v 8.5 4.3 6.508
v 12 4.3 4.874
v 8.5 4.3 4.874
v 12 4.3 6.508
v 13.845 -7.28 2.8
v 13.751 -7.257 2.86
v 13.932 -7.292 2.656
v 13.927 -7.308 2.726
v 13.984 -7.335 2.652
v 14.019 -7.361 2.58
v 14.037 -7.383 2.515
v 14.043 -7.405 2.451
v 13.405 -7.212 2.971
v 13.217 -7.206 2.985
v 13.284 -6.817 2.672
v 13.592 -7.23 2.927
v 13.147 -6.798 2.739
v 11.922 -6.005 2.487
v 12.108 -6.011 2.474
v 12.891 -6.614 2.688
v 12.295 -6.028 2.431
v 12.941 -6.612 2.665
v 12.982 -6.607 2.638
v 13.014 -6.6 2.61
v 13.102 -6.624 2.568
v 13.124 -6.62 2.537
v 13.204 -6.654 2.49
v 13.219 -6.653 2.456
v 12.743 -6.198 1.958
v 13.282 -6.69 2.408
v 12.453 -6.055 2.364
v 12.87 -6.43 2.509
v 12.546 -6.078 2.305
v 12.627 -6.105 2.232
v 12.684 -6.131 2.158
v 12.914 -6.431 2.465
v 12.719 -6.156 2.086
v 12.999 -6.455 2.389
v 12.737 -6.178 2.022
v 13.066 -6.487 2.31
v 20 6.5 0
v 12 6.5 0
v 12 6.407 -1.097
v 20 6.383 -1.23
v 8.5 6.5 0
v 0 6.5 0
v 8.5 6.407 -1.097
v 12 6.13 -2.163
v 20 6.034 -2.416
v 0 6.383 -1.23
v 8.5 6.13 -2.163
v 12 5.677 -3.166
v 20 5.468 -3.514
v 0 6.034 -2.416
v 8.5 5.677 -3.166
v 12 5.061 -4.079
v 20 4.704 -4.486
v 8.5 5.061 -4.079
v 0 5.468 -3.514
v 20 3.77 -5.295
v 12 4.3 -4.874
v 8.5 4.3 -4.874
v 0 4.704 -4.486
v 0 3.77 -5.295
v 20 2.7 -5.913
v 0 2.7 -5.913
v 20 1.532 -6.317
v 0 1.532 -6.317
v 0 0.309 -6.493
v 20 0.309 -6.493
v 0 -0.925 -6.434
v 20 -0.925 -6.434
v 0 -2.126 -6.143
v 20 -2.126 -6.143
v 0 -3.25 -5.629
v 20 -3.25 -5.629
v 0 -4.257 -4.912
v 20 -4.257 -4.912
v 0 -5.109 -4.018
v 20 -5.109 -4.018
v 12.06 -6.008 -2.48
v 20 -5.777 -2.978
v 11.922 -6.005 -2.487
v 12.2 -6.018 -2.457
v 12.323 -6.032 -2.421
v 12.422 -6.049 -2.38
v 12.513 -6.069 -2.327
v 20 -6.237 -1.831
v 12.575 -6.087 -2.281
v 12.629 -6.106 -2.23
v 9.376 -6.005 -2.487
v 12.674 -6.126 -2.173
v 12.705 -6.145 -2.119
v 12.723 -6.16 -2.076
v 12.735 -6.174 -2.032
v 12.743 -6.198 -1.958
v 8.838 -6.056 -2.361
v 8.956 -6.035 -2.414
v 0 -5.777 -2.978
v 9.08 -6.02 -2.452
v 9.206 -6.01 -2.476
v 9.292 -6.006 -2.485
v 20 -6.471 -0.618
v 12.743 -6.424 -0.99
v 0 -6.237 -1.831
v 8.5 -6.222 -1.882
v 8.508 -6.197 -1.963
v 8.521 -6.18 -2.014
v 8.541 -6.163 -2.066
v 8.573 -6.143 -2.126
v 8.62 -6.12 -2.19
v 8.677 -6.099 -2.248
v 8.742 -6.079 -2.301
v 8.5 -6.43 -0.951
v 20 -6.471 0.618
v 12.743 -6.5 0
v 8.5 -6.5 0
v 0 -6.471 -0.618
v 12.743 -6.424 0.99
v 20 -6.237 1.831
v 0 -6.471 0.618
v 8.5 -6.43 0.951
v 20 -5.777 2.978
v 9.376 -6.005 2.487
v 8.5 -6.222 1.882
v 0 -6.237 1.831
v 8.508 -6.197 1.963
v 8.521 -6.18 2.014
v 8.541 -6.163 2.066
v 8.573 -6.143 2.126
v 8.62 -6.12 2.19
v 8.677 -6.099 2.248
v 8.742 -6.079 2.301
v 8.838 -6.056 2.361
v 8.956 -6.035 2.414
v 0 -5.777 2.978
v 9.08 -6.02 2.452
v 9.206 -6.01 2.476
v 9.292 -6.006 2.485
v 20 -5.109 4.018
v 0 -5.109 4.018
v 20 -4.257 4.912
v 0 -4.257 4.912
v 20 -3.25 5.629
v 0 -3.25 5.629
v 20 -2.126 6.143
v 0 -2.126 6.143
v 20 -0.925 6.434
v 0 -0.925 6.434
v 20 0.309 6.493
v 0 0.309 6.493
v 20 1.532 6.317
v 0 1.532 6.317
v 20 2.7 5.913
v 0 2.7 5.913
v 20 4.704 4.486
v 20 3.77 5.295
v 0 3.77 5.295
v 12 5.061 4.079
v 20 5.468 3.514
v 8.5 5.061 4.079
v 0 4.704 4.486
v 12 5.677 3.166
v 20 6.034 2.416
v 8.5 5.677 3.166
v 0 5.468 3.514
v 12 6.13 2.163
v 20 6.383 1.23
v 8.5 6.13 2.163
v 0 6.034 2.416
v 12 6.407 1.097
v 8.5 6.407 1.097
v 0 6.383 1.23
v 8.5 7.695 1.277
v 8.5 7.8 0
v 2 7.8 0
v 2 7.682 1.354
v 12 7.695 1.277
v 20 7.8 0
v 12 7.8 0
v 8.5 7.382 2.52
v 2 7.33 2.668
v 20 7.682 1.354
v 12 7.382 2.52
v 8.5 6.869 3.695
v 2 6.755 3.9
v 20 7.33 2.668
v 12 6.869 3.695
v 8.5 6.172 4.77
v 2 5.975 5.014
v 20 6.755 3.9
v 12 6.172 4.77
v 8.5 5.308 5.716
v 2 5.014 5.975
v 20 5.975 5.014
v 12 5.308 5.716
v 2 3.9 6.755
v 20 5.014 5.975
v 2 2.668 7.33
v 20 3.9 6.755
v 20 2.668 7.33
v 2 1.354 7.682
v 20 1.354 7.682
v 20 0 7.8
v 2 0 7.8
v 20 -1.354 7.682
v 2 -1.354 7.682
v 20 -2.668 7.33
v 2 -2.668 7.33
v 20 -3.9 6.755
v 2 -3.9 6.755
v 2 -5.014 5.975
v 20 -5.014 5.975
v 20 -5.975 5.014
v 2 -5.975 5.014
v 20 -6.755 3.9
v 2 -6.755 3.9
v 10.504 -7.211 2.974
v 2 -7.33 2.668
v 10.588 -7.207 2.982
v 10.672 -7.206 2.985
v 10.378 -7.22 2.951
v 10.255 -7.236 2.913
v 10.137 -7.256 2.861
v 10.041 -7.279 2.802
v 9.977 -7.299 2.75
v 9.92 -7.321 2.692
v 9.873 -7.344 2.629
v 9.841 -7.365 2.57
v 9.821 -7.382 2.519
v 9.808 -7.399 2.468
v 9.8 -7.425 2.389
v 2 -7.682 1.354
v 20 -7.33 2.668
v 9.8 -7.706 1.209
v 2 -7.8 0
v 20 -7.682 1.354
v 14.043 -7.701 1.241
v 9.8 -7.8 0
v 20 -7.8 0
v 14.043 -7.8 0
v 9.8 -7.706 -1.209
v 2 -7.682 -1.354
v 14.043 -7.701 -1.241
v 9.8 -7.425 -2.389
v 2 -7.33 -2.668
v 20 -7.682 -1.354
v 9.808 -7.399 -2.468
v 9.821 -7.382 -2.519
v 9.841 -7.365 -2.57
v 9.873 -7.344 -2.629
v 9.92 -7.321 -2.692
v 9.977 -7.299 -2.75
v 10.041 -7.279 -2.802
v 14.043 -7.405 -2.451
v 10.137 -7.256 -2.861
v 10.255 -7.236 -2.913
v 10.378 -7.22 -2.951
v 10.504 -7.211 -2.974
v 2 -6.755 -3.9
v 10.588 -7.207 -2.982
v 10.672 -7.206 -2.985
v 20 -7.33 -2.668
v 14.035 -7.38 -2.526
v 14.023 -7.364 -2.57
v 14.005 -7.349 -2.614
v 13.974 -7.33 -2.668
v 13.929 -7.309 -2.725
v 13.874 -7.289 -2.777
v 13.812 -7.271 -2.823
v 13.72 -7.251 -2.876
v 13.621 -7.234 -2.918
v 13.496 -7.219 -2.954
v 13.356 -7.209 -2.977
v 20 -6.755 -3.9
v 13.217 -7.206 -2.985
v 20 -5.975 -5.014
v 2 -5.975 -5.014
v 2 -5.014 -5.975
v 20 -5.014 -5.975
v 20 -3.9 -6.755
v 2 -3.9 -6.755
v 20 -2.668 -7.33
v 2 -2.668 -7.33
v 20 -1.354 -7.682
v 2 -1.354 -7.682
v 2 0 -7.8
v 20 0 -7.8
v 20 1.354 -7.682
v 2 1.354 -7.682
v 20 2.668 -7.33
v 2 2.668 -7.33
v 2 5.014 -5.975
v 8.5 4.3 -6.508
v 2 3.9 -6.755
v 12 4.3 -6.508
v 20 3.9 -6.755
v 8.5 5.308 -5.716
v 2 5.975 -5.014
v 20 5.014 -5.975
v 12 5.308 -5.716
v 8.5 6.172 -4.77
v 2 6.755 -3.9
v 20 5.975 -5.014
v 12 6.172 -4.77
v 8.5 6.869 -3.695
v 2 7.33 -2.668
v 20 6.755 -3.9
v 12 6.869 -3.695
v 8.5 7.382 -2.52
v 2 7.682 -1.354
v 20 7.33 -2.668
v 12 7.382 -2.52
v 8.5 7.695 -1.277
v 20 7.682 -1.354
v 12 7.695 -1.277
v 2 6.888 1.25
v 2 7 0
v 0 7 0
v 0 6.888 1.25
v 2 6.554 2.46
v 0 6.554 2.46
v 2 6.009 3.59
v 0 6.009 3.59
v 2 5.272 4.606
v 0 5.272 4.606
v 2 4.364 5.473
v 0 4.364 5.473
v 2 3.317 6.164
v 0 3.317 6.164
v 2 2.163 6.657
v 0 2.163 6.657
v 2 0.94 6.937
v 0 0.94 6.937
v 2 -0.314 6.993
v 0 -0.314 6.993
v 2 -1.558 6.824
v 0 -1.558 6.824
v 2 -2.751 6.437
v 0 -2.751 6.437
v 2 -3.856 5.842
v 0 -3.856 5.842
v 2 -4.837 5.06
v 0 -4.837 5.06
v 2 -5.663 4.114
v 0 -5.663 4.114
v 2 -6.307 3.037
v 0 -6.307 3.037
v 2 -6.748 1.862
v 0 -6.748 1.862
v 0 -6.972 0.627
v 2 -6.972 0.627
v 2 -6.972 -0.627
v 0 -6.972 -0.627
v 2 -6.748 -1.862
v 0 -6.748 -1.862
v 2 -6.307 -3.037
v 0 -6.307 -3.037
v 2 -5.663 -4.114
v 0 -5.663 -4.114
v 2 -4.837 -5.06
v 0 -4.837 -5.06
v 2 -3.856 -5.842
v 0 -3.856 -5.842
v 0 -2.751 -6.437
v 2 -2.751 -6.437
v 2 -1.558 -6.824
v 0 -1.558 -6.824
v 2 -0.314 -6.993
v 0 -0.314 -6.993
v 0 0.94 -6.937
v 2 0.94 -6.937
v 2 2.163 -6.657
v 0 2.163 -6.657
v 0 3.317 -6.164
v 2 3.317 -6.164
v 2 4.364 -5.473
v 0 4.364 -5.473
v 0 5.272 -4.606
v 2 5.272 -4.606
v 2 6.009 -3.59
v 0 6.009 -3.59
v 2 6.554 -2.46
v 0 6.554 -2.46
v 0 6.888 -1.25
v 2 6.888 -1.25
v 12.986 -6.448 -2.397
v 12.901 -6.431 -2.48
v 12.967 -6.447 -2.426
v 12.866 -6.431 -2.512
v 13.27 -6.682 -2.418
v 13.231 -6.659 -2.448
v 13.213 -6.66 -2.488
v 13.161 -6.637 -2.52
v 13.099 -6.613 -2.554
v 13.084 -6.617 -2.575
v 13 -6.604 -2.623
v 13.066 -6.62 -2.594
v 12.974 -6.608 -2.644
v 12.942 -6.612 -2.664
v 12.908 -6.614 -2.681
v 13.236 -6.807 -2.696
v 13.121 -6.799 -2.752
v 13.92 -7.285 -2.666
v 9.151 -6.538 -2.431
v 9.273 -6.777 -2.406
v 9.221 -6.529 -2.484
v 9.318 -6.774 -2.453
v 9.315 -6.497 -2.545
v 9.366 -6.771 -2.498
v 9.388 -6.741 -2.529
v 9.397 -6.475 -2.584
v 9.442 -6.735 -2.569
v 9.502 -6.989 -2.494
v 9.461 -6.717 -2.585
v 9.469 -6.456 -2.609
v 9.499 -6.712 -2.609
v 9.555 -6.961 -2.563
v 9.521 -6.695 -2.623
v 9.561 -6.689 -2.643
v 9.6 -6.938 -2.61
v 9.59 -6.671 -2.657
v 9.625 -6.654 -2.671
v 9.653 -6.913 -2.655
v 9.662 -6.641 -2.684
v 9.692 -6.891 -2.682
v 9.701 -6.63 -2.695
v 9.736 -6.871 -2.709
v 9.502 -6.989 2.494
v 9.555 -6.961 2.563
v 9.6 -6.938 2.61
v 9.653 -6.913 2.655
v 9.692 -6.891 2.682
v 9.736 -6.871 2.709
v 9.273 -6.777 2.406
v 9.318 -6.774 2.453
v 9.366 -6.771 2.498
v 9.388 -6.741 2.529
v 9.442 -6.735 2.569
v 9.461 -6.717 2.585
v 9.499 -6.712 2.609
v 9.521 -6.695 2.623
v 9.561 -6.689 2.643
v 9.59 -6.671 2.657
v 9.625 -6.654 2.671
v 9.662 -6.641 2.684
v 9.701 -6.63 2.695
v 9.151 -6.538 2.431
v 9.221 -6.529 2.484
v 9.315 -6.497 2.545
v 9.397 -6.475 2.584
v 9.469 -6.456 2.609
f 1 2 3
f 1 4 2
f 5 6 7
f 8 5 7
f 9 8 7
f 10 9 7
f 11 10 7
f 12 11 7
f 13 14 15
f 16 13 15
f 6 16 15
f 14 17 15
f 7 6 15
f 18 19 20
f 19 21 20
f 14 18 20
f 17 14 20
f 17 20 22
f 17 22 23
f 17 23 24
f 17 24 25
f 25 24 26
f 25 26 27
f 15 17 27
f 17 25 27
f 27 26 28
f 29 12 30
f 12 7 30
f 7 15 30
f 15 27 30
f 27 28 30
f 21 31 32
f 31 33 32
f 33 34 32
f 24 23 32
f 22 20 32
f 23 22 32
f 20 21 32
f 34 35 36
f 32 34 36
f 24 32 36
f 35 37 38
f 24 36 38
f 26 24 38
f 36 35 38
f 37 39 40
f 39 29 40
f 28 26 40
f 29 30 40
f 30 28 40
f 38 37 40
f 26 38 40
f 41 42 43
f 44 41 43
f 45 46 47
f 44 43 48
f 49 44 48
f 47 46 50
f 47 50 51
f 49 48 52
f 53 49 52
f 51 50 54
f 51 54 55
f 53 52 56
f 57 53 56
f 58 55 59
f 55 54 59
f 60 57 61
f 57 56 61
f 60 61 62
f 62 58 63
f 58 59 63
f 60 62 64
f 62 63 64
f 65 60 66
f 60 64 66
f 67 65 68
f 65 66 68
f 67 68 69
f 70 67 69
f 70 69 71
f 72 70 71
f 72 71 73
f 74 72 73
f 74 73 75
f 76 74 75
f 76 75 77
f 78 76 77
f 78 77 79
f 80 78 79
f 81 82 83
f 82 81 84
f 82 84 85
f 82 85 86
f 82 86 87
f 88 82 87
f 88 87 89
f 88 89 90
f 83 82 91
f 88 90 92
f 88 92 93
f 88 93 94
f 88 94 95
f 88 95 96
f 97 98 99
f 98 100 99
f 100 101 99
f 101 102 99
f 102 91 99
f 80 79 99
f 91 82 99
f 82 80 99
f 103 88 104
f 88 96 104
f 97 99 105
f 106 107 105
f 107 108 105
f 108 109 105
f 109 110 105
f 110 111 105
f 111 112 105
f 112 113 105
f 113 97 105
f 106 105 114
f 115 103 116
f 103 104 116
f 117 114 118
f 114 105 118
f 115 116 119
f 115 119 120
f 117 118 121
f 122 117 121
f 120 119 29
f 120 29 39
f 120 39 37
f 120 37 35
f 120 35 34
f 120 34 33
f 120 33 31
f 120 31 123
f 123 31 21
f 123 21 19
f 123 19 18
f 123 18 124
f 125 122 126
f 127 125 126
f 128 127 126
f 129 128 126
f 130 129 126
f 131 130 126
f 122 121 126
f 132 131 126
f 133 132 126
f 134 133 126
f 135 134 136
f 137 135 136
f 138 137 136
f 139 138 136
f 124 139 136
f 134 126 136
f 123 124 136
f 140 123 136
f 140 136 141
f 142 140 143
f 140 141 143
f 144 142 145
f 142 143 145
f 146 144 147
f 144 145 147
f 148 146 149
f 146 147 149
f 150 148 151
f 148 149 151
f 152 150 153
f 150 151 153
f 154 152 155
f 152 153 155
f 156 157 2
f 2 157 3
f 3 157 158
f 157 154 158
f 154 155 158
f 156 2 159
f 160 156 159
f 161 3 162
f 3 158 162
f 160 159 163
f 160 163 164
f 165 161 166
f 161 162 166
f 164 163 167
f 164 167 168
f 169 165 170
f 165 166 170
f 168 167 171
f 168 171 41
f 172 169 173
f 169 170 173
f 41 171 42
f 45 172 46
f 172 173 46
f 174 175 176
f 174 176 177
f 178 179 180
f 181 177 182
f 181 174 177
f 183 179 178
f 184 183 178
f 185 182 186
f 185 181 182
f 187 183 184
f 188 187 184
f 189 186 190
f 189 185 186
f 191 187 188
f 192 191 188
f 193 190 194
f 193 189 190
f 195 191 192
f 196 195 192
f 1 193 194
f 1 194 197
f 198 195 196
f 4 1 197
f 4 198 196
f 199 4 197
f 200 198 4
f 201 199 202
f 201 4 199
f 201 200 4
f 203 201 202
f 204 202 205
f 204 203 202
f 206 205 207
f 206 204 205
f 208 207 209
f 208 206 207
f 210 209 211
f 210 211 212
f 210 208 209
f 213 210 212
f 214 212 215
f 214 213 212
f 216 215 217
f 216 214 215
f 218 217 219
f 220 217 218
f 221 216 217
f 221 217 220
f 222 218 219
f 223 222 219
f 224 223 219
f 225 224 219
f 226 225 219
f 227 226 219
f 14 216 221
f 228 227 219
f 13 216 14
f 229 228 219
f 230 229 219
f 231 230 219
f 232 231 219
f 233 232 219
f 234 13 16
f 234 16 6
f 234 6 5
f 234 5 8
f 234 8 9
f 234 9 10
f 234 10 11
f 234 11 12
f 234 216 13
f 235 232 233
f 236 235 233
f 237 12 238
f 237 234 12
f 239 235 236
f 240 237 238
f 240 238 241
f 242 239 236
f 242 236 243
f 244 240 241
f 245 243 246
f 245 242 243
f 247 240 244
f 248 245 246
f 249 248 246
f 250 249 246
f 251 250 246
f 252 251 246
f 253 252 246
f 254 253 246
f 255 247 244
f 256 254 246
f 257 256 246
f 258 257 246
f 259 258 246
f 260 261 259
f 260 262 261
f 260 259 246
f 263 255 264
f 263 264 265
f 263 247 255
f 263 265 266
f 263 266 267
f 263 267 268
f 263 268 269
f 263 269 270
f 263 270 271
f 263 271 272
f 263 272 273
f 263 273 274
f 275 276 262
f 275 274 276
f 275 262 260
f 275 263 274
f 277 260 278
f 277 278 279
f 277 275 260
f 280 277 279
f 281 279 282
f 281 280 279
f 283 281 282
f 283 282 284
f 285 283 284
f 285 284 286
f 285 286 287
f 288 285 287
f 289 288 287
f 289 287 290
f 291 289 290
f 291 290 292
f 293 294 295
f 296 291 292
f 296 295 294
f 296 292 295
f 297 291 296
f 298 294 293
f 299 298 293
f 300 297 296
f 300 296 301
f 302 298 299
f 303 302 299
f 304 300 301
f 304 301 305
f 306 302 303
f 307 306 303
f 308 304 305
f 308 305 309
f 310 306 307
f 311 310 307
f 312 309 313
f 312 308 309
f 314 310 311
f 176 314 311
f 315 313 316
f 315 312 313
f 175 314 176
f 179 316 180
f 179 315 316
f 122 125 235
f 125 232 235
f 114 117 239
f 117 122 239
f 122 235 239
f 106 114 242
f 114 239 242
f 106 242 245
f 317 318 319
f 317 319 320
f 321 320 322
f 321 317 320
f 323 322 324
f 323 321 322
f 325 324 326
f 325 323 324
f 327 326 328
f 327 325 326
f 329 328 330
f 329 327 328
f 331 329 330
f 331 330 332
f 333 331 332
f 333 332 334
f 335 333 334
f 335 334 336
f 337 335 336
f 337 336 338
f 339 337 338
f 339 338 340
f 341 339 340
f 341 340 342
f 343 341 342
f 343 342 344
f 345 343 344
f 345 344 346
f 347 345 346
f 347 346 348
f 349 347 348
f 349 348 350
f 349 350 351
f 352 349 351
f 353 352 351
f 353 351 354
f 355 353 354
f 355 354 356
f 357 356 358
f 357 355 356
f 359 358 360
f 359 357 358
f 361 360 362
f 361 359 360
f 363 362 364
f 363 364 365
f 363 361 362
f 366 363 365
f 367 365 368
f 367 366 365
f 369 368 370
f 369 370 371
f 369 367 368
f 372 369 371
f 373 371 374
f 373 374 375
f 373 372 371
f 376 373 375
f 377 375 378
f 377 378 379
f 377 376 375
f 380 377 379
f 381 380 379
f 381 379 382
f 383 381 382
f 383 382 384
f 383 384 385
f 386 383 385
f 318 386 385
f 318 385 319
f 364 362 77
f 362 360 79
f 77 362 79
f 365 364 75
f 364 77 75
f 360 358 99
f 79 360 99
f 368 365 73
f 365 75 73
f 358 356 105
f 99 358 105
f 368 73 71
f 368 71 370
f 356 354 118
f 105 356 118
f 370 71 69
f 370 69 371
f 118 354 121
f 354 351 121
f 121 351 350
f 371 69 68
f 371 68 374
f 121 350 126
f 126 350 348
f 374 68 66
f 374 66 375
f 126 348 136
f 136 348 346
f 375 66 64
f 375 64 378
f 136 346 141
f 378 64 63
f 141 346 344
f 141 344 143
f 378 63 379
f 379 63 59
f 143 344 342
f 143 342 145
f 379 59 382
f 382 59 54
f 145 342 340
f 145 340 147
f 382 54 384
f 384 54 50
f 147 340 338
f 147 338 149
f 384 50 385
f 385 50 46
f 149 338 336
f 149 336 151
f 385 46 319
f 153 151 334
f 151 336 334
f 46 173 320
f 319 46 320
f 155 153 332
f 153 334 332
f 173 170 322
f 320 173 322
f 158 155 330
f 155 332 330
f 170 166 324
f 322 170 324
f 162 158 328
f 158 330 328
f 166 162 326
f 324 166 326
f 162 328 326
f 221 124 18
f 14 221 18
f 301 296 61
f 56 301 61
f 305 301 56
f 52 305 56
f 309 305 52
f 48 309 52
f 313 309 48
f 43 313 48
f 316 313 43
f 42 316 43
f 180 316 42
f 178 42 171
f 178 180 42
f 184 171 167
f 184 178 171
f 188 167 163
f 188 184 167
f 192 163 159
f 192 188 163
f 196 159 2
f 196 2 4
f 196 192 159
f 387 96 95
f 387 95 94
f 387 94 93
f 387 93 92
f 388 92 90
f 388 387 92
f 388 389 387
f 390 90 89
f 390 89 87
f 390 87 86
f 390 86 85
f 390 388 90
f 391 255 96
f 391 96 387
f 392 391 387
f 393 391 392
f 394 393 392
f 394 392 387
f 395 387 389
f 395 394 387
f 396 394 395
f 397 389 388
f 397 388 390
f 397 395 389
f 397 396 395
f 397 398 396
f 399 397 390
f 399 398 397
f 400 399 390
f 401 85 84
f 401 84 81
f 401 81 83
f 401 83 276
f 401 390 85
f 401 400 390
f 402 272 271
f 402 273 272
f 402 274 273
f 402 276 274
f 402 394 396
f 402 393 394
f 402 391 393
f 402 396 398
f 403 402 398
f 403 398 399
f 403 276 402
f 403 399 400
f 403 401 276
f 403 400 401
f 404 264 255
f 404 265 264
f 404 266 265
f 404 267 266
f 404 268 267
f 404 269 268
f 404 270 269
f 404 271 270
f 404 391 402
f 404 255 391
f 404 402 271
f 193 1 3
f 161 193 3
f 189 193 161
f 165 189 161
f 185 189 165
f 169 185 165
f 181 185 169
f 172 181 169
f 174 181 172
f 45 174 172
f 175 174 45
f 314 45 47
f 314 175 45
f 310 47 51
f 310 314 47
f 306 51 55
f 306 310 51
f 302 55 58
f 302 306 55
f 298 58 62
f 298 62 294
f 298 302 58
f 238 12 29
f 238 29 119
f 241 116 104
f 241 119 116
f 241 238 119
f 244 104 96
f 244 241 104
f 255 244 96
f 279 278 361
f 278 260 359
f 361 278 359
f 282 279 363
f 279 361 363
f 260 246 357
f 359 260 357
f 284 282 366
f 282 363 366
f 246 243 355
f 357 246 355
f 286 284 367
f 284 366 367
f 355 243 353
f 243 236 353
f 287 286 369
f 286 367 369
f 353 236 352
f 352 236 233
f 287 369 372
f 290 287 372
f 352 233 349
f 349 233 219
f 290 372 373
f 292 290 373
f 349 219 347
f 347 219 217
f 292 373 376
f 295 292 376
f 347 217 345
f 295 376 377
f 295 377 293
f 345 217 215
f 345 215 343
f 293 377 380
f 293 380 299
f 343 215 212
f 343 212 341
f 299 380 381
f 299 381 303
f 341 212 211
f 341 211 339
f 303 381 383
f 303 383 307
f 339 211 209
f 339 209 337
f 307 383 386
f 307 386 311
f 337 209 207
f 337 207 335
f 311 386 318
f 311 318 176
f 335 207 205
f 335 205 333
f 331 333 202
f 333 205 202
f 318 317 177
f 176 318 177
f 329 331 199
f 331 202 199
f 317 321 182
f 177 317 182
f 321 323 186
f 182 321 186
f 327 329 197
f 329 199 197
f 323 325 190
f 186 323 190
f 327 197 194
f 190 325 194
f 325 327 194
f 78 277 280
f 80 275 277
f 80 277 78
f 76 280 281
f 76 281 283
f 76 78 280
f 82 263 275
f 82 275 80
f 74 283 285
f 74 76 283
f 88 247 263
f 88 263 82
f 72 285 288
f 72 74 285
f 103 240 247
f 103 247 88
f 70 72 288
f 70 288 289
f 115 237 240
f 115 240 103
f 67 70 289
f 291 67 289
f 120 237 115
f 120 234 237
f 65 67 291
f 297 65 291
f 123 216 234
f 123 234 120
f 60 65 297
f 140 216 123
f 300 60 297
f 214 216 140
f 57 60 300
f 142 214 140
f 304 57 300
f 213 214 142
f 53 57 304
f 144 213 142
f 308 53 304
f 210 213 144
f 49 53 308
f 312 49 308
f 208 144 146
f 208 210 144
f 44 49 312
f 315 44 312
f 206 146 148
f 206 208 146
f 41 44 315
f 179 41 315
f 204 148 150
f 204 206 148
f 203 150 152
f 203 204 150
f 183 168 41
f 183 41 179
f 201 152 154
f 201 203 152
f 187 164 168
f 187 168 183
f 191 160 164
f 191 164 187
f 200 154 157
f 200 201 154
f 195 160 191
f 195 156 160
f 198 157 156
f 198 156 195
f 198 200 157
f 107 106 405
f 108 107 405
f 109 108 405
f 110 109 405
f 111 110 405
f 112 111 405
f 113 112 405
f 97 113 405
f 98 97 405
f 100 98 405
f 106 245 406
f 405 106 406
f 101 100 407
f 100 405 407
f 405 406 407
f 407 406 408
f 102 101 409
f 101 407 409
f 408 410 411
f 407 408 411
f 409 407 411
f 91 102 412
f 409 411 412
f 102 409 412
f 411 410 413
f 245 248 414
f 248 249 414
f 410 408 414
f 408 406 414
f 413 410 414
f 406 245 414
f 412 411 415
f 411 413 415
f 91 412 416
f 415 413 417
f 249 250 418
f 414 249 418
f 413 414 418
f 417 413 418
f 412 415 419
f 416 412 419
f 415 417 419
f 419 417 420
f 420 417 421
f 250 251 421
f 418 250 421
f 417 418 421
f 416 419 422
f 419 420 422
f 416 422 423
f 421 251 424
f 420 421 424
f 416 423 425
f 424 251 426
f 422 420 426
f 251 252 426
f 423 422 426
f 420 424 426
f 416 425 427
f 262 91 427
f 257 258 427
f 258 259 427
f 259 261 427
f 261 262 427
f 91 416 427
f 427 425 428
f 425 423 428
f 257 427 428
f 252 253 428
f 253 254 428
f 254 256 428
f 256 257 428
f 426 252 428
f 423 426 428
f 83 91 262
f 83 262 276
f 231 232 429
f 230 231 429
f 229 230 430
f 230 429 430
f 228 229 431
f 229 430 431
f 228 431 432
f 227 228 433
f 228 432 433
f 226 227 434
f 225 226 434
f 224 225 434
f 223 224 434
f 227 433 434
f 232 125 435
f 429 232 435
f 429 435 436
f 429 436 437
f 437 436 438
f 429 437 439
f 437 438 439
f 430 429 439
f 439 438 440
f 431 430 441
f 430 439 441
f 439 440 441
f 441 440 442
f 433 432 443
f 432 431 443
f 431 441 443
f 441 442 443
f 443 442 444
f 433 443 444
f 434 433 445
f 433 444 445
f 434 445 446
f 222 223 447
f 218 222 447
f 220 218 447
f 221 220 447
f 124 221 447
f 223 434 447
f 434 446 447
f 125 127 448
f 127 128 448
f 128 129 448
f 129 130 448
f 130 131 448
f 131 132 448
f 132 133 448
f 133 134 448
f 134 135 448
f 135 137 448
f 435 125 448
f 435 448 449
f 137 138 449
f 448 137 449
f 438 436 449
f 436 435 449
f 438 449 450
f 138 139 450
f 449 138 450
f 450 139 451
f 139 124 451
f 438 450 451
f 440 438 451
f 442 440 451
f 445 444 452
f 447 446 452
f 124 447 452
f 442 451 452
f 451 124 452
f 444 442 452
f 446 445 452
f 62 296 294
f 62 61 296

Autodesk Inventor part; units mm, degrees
ref_plane "YZ-Ebene" through (0, 0, 0) normal (1, 0, 0) x (0, 1, 0)
ref_plane "XY-Ebene" through (0, 0, 0) normal (0, 0, 1) x (1, 0, 0)
sketch "Skizze1" plane through (0, 0, 0) normal (0, 0, 1) x (1, 0, 0)
  line L0 (-4, 0) -> (24, 0) projected
  line L1 (0, -1.56) -> (0, 9.36) projected
  line L2 (0, 7) -> (2, 7)
  line L3 (2, 7) -> (2, 7.8)
  line L4 (2, 7.8) -> (20, 7.8)
  line L5 (20, 7.8) -> (20, 6.5)
  line L6 (20, 6.5) -> (0, 6.5)
  line L7 (0, 7) -> (0, 6.5)
  point P0 (0, 0)
  dimension "d0" = 6.5
  dimension "d1" = 7.8
  dimension "d2" = 7
  dimension "d3" = 2
  dimension "d4" = 20
revolve "Umdrehung1" add sketch "Skizze1" angle 360 about axis through (-10, 0, 0) along (1, 0, 0)
ref_plane "Arbeitsebene1" through (11, 7.8, 0) normal (0, 1, 0) x (-1, 0, 0)
sketch "Skizze2" plane through (11, 7.8, 0) normal (0, 1, 0) x (-1, 0, 0)
  line L0 (9, 7.8) -> (9, -7.8) projected
  line L1 (-9, 7.8) -> (-9, -7.8) projected
  line L2 (9, -7.8) -> (-9, -7.8) projected
  line L3 (9, 7.8) -> (-9, 7.8) projected
  line L4 (2.5, 10) -> (2.5, -10)
  line L5 (2.5, -10) -> (-1, -10)
  line L6 (-1, -10) -> (-1, 10)
  line L7 (-1, 10) -> (2.5, 10)
  line L8 (11, 7) -> (11, -7) projected
  line L9 (15, 0) -> (-13, 0) projected
  point P0 (11, 0)
  dimension "d6" = 20
  dimension "d7" = 3.5
  dimension "d8" = 8.5
extrude "Extrusion1" cut sketch "Skizze2" against normal blind 3.5 contours L4 L9 L6 L3 | L3 L6 L7 L4 | L4 L2 L6 L9 | L4 L5 L6 L2
sketch "Skizze3" plane through (0, 0, 0) normal (0, 0, 1) x (1, 0, 0)
  point P0 (0, 0)
sketch "Skizze4" plane through (0, 0, 0) normal (1, 0, 0) x (0, 1, 0)
  point P0 (0, 0)
sketch "Skizze5" plane through (0, 0, 0) normal (0, 0, 1) x (1, 0, 0)
  point P0 (0, 0)
sketch "Skizze6" plane through (0, 0, 0) normal (0, 0, 1) x (1, 0, 0)
  point P0 (0, 0)
sketch "Skizze7" plane through (0, 0, 0) normal (0, 0, 1) x (1, 0, 0)
  line L0 (2, -7.8) -> (20, -7.8) projected
  line L1 (12.982, -10.982) -> (6.618, -4.618)
  line L2 (15.1033, -8.8607) -> (12.982, -10.982)
  line L3 (6.618, -4.618) -> (8.7393, -2.4967)
  line L4 (15.1033, -8.8607) -> (8.7393, -2.4967)
  line L5 (20, -6.5) -> (20, 6.5) projected
  line L6 (-4, 0) -> (24, 0) projected
  point P0 (0, 0)
  point P1 (9.8, -7.8)
  dimension "d12" = 9
  dimension "d13" = 3
  dimension "d14" = 10.2
  dimension "d19" = 9
  dimension "d20" = 3
  dimension "d21" = 45
revolve "Umdrehung2" cut sketch "Skizze7" angle 45 mid plane about axis through (-10, 0, 0) along (1, 0, 0)
fillet "Rundung1" radius 0.6 4 edges at (13.3926, -6.6057, -2.7362) (13.3926, -6.6057, 2.7362) (9.15, -6.6057, 2.7362) (9.15, -6.6057, -2.7362)
properties part number "Zylinderbuchse_ra8846s" material "Stahl, Guss"
